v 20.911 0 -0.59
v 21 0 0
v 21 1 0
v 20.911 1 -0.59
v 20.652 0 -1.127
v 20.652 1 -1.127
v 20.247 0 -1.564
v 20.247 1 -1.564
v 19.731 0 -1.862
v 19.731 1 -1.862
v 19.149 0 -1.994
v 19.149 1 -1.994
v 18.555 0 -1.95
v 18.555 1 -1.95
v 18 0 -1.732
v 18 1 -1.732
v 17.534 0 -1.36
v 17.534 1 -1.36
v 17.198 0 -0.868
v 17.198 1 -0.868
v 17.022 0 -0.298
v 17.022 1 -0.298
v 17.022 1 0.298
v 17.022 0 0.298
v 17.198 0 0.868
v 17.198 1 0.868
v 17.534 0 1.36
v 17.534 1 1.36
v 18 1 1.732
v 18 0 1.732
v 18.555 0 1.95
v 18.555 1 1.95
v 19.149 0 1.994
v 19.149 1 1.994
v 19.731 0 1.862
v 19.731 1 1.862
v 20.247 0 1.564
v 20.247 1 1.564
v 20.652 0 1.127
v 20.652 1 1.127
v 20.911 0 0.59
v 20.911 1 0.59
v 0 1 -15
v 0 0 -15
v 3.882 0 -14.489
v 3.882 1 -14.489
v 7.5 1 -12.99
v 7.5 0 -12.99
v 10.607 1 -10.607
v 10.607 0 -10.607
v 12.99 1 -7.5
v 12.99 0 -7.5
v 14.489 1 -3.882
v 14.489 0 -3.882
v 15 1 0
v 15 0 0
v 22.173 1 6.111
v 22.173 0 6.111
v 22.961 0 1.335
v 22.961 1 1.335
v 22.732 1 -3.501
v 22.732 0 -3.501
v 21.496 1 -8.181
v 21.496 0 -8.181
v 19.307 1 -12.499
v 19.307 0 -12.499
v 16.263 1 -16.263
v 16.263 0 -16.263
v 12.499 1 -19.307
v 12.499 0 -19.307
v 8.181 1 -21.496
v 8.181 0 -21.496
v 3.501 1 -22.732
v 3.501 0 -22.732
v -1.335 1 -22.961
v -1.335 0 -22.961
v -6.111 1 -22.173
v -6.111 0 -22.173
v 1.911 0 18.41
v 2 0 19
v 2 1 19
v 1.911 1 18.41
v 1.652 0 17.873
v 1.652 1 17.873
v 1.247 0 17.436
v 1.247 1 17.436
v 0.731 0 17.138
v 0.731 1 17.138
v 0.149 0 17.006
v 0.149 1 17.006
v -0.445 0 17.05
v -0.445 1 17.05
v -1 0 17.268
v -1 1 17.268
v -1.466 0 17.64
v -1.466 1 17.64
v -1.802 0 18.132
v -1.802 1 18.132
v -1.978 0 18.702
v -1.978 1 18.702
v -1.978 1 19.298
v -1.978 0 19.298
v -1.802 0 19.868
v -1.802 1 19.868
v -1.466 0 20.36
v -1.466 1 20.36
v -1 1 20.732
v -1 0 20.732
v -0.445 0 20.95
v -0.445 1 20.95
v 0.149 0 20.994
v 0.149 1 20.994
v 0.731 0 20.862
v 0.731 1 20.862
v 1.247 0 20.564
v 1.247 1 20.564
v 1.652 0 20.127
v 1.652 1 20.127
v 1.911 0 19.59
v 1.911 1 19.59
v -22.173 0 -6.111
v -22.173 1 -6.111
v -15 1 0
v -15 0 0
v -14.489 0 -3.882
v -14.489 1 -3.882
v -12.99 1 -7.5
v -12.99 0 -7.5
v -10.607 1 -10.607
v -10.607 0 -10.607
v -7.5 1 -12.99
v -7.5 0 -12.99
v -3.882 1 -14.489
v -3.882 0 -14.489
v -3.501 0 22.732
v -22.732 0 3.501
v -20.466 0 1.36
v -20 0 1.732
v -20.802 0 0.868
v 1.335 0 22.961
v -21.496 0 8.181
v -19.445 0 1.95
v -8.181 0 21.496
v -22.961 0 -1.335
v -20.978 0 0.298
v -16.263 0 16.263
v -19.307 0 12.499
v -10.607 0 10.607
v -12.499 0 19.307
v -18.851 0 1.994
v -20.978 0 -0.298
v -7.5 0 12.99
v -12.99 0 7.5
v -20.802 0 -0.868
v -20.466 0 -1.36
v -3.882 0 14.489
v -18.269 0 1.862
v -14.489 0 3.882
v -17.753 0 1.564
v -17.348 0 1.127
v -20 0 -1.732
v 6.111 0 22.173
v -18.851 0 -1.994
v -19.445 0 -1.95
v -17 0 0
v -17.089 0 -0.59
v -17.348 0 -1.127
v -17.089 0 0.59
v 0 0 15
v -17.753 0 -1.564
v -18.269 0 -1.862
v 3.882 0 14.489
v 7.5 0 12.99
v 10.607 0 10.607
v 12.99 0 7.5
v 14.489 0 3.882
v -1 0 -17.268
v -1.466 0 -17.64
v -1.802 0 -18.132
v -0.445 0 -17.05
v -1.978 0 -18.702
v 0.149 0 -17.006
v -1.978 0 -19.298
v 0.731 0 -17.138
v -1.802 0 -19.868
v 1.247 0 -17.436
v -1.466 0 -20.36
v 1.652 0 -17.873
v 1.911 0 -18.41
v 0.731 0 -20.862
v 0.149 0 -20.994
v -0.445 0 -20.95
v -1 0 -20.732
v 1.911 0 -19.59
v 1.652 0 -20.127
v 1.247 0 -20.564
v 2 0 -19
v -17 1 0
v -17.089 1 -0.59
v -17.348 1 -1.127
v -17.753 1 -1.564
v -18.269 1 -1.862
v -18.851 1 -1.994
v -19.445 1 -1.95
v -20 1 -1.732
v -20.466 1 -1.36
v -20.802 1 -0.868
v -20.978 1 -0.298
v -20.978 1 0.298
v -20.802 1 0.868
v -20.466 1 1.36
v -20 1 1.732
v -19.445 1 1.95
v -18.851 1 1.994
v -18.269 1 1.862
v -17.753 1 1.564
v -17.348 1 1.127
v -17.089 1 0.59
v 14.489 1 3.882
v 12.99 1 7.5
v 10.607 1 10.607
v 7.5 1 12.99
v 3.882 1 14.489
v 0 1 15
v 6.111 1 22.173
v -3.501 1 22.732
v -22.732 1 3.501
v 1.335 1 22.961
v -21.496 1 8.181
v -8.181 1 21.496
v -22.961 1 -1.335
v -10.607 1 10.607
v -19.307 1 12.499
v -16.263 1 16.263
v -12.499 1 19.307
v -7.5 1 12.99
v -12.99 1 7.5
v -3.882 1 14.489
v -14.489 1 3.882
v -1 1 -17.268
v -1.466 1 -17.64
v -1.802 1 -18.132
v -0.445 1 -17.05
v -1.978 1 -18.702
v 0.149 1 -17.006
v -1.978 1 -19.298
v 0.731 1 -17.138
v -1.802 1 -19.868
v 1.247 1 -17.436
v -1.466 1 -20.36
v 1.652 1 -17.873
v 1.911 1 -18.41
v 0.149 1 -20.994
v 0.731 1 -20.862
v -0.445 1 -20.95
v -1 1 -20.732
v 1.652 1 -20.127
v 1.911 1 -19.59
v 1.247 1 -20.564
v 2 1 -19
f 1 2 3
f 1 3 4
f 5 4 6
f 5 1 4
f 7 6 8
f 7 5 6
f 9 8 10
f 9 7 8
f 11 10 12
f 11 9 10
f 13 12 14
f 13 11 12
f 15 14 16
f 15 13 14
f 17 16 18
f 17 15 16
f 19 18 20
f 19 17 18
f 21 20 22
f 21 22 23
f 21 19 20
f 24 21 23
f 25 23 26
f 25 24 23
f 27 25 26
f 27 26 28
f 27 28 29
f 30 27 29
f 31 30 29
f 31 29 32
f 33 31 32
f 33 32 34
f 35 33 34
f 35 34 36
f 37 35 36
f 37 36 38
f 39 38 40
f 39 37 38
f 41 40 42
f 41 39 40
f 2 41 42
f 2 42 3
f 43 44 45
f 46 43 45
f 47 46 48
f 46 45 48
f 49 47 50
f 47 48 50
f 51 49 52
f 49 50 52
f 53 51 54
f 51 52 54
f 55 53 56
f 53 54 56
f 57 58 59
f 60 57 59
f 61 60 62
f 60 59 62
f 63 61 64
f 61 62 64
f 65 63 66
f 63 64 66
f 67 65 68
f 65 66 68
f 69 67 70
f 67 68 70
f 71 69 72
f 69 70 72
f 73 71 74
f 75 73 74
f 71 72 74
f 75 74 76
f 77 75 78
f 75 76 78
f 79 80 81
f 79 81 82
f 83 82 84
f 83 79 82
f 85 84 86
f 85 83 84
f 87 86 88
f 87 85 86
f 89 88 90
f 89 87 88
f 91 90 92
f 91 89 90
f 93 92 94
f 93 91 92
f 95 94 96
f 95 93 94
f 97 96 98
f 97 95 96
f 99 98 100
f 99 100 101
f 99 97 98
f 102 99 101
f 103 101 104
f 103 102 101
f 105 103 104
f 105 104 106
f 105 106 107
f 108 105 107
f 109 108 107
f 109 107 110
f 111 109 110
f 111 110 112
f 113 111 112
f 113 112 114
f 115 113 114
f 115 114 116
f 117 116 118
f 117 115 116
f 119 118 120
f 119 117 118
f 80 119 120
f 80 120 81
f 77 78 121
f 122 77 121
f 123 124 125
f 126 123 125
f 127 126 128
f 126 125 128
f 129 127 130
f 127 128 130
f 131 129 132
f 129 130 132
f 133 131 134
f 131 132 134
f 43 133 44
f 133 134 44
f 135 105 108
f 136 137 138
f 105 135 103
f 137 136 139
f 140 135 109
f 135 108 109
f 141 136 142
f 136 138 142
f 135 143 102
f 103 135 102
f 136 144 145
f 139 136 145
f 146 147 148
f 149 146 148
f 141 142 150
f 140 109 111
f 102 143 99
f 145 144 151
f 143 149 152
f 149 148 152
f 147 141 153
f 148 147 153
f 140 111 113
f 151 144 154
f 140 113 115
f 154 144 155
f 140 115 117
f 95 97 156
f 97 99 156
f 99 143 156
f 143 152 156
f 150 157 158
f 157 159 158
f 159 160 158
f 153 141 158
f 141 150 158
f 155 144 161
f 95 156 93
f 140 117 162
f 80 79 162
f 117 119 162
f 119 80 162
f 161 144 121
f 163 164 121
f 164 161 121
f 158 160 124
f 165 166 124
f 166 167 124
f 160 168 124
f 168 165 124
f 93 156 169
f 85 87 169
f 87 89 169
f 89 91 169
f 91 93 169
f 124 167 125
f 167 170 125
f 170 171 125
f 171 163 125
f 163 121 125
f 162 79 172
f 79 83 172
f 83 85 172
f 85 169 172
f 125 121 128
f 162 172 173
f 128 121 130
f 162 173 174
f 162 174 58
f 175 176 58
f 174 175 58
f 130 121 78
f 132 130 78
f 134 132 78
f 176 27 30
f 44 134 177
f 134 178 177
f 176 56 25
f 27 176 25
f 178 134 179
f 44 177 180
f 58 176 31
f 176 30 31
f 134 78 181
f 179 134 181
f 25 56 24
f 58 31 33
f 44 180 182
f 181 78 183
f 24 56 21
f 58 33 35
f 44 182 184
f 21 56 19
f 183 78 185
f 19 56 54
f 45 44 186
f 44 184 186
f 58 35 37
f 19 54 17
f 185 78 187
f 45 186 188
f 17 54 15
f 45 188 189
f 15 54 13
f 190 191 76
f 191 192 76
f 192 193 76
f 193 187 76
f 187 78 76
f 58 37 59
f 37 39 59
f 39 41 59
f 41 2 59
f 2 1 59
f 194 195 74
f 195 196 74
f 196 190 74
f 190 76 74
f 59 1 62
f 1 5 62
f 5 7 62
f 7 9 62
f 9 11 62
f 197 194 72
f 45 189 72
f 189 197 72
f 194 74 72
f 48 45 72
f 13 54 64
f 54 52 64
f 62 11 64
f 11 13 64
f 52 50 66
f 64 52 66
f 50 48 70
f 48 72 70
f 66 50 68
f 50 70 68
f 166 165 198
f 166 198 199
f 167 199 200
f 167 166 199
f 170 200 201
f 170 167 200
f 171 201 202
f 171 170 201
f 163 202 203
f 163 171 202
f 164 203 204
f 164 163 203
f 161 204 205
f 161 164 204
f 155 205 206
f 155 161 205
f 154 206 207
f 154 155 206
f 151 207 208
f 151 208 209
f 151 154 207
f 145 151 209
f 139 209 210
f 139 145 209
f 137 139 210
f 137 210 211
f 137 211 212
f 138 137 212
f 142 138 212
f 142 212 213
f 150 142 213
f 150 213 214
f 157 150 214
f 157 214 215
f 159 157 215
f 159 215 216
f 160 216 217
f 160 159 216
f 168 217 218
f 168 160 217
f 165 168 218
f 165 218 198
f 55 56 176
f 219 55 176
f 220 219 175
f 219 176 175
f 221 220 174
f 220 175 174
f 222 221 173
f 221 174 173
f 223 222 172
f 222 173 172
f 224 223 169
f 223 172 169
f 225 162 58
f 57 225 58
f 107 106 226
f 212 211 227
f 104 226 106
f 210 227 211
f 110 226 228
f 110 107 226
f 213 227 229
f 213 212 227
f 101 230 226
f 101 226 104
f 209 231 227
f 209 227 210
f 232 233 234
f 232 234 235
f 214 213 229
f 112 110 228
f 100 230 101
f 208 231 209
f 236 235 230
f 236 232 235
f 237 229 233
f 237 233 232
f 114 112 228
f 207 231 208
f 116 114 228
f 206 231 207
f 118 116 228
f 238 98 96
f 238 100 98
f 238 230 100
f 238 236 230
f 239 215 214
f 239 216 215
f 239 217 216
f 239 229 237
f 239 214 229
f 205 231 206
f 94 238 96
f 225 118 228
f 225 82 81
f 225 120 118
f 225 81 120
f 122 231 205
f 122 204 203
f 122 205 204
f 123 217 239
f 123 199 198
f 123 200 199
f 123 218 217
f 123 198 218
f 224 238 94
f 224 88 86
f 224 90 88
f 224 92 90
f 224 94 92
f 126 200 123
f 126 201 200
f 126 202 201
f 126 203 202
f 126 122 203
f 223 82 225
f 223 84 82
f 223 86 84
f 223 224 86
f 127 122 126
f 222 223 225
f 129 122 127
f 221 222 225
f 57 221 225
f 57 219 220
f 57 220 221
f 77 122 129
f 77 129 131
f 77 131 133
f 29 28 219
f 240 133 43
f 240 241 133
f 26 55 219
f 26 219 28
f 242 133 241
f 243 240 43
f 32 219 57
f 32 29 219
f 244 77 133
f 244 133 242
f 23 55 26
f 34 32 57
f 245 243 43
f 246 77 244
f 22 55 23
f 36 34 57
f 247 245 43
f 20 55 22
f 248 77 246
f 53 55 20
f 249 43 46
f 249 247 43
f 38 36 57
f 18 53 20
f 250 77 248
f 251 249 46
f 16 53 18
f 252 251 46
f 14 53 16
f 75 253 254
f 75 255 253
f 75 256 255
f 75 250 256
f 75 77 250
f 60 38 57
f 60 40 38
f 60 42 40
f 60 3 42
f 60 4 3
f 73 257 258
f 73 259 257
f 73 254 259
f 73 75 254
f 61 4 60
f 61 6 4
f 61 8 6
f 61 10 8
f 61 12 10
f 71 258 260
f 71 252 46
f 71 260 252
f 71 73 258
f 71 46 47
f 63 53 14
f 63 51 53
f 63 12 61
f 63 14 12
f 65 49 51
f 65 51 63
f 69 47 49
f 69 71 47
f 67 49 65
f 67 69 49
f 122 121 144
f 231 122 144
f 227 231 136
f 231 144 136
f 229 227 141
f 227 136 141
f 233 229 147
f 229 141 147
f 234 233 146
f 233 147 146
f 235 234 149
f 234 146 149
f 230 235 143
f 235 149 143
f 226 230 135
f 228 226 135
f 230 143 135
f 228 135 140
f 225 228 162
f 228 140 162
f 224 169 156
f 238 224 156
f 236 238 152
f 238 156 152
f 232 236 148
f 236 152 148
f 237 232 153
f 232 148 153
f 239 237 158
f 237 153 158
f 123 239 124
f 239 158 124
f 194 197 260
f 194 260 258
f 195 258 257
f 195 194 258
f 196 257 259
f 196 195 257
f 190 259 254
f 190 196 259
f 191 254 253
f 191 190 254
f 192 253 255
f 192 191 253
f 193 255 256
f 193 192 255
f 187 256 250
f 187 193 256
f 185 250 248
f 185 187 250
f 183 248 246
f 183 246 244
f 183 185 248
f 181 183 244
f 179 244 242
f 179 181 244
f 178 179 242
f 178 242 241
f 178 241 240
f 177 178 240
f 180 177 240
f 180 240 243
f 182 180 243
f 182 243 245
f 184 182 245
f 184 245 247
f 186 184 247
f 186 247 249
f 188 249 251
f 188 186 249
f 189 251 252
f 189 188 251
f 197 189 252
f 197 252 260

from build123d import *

# Parameters (mm, degrees)
SKETCH2_R           = 2
BOSS_EXTRUDE1_DEPTH = 1


with BuildPart() as part:
    # Sketch2 → Boss-Extrude1 (new body)
    with BuildSketch(Plane(origin=(0, 0, 0), x_dir=(1, 0, 0), z_dir=(0, 1, 0))):
        with BuildLine():
            ThreePointArc((-22.173324826, 6.110946422), (-16.263455967, -16.263455967), (6.110946422, -22.173324826))
            Line((6.110946422, -22.173324826), (22.173324826, -6.110946422))
            ThreePointArc((22.173324826, -6.110946422), (16.263455967, 16.263455967), (-6.110946422, 22.173324826))
            Line((-6.110946422, 22.173324826), (-22.173324826, 6.110946422))
        make_face()
        with BuildLine():
            ThreePointArc((0, 15), (10.606601718, 10.606601718), (15, 0))
            ThreePointArc((15, 0), (10.606601718, -10.606601718), (0, -15))
            ThreePointArc((0, -15), (-10.606601718, -10.606601718), (-15, 0))
            ThreePointArc((-15, 0), (-10.606601718, 10.606601718), (0, 15))
        make_face(mode=Mode.SUBTRACT)
        with Locations((-19, 0)):
            Circle(SKETCH2_R, mode=Mode.SUBTRACT)
        with Locations((0, 19)):
            Circle(SKETCH2_R, mode=Mode.SUBTRACT)
        with Locations((0, -19)):
            Circle(SKETCH2_R, mode=Mode.SUBTRACT)
        with Locations((19, 0)):
            Circle(SKETCH2_R, mode=Mode.SUBTRACT)
    extrude(amount=BOSS_EXTRUDE1_DEPTH)


solid = part.part
